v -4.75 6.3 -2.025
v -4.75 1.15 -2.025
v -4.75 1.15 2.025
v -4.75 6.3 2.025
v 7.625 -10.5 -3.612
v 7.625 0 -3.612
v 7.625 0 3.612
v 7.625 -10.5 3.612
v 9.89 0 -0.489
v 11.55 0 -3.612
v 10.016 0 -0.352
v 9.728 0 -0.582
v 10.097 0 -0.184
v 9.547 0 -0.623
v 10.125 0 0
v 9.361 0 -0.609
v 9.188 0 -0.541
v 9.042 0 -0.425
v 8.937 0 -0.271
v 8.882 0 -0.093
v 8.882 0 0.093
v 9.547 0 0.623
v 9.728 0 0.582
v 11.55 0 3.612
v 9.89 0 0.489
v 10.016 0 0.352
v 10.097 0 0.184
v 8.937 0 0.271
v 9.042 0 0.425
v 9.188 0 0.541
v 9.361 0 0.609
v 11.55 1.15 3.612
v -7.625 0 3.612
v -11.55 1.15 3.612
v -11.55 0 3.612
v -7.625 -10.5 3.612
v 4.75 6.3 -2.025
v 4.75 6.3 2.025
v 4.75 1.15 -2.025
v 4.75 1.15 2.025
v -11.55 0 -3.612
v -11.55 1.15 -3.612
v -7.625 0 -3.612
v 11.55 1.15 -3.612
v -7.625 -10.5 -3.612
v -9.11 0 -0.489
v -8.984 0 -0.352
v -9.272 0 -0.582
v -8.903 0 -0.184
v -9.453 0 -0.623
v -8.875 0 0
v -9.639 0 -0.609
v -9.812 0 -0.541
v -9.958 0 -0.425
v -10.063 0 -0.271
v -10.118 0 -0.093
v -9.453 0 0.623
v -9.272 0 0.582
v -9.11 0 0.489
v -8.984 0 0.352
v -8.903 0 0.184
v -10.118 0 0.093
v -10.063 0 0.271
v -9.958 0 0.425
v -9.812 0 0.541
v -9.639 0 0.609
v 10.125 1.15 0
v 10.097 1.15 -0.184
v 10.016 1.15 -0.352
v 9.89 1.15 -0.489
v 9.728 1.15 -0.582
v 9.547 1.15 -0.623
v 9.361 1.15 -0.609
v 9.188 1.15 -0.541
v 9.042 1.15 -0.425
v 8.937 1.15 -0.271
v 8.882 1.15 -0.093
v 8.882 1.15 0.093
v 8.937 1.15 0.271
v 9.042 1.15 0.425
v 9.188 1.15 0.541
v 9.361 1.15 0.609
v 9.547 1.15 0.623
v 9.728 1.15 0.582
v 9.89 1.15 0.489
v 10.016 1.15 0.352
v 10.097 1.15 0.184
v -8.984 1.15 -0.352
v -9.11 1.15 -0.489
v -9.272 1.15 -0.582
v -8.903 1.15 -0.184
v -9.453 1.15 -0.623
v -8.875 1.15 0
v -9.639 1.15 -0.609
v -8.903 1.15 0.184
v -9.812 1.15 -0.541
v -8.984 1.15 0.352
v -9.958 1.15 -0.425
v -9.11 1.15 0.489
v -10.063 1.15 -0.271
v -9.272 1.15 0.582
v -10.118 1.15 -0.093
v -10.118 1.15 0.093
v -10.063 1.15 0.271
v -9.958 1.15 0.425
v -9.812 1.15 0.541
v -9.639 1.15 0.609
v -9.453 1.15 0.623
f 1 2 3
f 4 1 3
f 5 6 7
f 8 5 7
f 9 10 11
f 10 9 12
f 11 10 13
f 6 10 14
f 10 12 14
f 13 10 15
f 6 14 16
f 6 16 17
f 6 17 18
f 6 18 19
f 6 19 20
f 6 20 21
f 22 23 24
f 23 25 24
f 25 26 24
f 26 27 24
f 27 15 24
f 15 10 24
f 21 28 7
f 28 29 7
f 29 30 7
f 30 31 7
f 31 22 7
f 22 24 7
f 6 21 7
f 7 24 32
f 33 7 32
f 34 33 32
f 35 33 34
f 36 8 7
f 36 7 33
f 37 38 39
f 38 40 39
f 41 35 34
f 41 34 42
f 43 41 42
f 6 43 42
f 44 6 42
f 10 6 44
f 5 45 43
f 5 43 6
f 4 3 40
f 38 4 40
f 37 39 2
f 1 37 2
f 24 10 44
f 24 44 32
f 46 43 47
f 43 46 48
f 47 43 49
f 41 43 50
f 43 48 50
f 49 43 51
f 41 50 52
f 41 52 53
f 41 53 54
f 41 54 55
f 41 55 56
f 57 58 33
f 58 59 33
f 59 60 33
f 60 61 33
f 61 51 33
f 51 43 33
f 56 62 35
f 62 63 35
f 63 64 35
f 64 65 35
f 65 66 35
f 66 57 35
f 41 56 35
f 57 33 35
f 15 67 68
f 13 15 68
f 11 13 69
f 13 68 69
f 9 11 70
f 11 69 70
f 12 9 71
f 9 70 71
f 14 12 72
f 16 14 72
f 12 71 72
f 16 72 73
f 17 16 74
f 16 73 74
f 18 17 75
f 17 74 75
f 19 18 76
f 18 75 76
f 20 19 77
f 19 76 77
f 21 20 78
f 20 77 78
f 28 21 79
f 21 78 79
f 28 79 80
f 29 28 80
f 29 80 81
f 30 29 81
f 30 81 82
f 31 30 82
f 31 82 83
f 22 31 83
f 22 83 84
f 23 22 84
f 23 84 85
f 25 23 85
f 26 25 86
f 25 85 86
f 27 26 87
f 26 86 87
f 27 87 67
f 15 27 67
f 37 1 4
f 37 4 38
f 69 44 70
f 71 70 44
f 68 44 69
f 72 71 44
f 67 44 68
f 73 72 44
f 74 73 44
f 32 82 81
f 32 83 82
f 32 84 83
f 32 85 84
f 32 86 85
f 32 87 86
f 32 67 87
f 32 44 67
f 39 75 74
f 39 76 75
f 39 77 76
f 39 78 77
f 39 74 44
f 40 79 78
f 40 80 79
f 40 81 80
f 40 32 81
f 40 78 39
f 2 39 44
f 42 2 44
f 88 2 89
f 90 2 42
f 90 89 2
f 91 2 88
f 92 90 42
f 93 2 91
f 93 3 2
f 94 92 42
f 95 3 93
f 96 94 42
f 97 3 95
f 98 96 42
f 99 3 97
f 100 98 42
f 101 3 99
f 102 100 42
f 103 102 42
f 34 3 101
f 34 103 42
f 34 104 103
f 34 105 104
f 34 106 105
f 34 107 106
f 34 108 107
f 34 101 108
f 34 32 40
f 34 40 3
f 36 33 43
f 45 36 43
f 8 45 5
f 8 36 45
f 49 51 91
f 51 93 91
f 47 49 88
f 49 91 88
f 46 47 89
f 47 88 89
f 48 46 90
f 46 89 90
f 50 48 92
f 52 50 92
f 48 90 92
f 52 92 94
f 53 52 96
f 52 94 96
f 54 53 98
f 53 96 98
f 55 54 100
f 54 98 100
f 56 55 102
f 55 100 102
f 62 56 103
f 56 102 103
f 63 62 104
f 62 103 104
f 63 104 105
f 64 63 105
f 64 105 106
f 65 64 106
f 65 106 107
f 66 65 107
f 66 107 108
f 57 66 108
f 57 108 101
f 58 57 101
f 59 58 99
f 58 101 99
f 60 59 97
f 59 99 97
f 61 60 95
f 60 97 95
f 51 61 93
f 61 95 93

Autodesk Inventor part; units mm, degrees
ref_plane "XZ Plane" through (0, 0, 0) normal (0, 1, 0) x (-1, 0, 0)
ref_plane "XY Plane" through (0, 0, 0) normal (0, 0, 1) x (1, 0, 0)
sketch "Sketch1" plane through (0, 0, 0) normal (0, 1, 0) x (-1, 0, 0)
  line L0 (-11.55, 3.6125) -> (11.55, 3.6125)
  line L1 (11.55, 3.6125) -> (11.55, -3.6125)
  line L2 (11.55, -3.6125) -> (-11.55, -3.6125)
  line L3 (-11.55, -3.6125) -> (-11.55, 3.6125)
  line L4 (-11.55, 3.6125) -> (11.55, -3.6125) construction
  line L5 (11.55, 3.6125) -> (-11.55, -3.6125) construction
  point P0 (0, 0)
  dimension "d0" = 23.1
  dimension "d1" = 7.225
extrude "Extrusion1" add sketch "Sketch1" along normal blind 1.15
sketch "Sketch2" plane through (0, 0, 0) normal (0, -1, 0) x (1, 0, 0)
  line L0 (-11.55, 3.6125) -> (11.55, 3.6125) projected
  line L1 (-7.625, -3.6125) -> (7.625, -3.6125)
  line L2 (7.625, -3.6125) -> (7.625, 3.6125)
  line L3 (7.625, 3.6125) -> (-7.625, 3.6125)
  line L4 (-7.625, 3.6125) -> (-7.625, -3.6125)
  line L5 (-7.625, -3.6125) -> (7.625, 3.6125) construction
  line L6 (7.625, -3.6125) -> (-7.625, 3.6125) construction
  point P0 (0, 0)
  dimension "d4" = 15.25
extrude "Extrusion2" add sketch "Sketch2" along normal blind 10.5
sketch "Sketch3" plane through (0, 1.15, 0) normal (0, 1, 0) x (1, 0, 0)
  line L0 (-4.75, -2.025) -> (4.75, -2.025)
  line L1 (4.75, -2.025) -> (4.75, 2.025)
  line L2 (4.75, 2.025) -> (-4.75, 2.025)
  line L3 (-4.75, 2.025) -> (-4.75, -2.025)
  line L4 (-4.75, -2.025) -> (4.75, 2.025) construction
  line L5 (4.75, -2.025) -> (-4.75, 2.025) construction
  point P0 (0, 0)
  dimension "d7" = 9.5
  dimension "d8" = 4.05
extrude "Extrusion3" add sketch "Sketch3" along normal blind 5.15
sketch "Sketch4" plane through (0, 1.15, 0) normal (0, 1, 0) x (1, 0, 0)
  line L0 (11.55, 3.6125) -> (-11.55, 3.6125) construction
  line L1 (0, 3.6125) -> (0, -3.6125) construction
  line L2 (-11.55, -3.6125) -> (11.55, -3.6125) construction
  line L3 (-11.55, 3.6125) -> (-11.55, -3.6125) construction
  line L4 (-11.55, 0) -> (11.55, 0) construction
  line L5 (11.55, -3.6125) -> (11.55, 3.6125) construction
  circle A0 centre (9.5, 0) radius 0.625
  circle A1 centre (-9.5, 0) radius 0.625
  point P0 (0, 0)
  dimension "d11" = 1.25
  dimension "d12" = 9.5
extrude "Extrusion4" cut sketch "Sketch4" against normal up to surface (1.15 mm away)
properties part number "Switch"
